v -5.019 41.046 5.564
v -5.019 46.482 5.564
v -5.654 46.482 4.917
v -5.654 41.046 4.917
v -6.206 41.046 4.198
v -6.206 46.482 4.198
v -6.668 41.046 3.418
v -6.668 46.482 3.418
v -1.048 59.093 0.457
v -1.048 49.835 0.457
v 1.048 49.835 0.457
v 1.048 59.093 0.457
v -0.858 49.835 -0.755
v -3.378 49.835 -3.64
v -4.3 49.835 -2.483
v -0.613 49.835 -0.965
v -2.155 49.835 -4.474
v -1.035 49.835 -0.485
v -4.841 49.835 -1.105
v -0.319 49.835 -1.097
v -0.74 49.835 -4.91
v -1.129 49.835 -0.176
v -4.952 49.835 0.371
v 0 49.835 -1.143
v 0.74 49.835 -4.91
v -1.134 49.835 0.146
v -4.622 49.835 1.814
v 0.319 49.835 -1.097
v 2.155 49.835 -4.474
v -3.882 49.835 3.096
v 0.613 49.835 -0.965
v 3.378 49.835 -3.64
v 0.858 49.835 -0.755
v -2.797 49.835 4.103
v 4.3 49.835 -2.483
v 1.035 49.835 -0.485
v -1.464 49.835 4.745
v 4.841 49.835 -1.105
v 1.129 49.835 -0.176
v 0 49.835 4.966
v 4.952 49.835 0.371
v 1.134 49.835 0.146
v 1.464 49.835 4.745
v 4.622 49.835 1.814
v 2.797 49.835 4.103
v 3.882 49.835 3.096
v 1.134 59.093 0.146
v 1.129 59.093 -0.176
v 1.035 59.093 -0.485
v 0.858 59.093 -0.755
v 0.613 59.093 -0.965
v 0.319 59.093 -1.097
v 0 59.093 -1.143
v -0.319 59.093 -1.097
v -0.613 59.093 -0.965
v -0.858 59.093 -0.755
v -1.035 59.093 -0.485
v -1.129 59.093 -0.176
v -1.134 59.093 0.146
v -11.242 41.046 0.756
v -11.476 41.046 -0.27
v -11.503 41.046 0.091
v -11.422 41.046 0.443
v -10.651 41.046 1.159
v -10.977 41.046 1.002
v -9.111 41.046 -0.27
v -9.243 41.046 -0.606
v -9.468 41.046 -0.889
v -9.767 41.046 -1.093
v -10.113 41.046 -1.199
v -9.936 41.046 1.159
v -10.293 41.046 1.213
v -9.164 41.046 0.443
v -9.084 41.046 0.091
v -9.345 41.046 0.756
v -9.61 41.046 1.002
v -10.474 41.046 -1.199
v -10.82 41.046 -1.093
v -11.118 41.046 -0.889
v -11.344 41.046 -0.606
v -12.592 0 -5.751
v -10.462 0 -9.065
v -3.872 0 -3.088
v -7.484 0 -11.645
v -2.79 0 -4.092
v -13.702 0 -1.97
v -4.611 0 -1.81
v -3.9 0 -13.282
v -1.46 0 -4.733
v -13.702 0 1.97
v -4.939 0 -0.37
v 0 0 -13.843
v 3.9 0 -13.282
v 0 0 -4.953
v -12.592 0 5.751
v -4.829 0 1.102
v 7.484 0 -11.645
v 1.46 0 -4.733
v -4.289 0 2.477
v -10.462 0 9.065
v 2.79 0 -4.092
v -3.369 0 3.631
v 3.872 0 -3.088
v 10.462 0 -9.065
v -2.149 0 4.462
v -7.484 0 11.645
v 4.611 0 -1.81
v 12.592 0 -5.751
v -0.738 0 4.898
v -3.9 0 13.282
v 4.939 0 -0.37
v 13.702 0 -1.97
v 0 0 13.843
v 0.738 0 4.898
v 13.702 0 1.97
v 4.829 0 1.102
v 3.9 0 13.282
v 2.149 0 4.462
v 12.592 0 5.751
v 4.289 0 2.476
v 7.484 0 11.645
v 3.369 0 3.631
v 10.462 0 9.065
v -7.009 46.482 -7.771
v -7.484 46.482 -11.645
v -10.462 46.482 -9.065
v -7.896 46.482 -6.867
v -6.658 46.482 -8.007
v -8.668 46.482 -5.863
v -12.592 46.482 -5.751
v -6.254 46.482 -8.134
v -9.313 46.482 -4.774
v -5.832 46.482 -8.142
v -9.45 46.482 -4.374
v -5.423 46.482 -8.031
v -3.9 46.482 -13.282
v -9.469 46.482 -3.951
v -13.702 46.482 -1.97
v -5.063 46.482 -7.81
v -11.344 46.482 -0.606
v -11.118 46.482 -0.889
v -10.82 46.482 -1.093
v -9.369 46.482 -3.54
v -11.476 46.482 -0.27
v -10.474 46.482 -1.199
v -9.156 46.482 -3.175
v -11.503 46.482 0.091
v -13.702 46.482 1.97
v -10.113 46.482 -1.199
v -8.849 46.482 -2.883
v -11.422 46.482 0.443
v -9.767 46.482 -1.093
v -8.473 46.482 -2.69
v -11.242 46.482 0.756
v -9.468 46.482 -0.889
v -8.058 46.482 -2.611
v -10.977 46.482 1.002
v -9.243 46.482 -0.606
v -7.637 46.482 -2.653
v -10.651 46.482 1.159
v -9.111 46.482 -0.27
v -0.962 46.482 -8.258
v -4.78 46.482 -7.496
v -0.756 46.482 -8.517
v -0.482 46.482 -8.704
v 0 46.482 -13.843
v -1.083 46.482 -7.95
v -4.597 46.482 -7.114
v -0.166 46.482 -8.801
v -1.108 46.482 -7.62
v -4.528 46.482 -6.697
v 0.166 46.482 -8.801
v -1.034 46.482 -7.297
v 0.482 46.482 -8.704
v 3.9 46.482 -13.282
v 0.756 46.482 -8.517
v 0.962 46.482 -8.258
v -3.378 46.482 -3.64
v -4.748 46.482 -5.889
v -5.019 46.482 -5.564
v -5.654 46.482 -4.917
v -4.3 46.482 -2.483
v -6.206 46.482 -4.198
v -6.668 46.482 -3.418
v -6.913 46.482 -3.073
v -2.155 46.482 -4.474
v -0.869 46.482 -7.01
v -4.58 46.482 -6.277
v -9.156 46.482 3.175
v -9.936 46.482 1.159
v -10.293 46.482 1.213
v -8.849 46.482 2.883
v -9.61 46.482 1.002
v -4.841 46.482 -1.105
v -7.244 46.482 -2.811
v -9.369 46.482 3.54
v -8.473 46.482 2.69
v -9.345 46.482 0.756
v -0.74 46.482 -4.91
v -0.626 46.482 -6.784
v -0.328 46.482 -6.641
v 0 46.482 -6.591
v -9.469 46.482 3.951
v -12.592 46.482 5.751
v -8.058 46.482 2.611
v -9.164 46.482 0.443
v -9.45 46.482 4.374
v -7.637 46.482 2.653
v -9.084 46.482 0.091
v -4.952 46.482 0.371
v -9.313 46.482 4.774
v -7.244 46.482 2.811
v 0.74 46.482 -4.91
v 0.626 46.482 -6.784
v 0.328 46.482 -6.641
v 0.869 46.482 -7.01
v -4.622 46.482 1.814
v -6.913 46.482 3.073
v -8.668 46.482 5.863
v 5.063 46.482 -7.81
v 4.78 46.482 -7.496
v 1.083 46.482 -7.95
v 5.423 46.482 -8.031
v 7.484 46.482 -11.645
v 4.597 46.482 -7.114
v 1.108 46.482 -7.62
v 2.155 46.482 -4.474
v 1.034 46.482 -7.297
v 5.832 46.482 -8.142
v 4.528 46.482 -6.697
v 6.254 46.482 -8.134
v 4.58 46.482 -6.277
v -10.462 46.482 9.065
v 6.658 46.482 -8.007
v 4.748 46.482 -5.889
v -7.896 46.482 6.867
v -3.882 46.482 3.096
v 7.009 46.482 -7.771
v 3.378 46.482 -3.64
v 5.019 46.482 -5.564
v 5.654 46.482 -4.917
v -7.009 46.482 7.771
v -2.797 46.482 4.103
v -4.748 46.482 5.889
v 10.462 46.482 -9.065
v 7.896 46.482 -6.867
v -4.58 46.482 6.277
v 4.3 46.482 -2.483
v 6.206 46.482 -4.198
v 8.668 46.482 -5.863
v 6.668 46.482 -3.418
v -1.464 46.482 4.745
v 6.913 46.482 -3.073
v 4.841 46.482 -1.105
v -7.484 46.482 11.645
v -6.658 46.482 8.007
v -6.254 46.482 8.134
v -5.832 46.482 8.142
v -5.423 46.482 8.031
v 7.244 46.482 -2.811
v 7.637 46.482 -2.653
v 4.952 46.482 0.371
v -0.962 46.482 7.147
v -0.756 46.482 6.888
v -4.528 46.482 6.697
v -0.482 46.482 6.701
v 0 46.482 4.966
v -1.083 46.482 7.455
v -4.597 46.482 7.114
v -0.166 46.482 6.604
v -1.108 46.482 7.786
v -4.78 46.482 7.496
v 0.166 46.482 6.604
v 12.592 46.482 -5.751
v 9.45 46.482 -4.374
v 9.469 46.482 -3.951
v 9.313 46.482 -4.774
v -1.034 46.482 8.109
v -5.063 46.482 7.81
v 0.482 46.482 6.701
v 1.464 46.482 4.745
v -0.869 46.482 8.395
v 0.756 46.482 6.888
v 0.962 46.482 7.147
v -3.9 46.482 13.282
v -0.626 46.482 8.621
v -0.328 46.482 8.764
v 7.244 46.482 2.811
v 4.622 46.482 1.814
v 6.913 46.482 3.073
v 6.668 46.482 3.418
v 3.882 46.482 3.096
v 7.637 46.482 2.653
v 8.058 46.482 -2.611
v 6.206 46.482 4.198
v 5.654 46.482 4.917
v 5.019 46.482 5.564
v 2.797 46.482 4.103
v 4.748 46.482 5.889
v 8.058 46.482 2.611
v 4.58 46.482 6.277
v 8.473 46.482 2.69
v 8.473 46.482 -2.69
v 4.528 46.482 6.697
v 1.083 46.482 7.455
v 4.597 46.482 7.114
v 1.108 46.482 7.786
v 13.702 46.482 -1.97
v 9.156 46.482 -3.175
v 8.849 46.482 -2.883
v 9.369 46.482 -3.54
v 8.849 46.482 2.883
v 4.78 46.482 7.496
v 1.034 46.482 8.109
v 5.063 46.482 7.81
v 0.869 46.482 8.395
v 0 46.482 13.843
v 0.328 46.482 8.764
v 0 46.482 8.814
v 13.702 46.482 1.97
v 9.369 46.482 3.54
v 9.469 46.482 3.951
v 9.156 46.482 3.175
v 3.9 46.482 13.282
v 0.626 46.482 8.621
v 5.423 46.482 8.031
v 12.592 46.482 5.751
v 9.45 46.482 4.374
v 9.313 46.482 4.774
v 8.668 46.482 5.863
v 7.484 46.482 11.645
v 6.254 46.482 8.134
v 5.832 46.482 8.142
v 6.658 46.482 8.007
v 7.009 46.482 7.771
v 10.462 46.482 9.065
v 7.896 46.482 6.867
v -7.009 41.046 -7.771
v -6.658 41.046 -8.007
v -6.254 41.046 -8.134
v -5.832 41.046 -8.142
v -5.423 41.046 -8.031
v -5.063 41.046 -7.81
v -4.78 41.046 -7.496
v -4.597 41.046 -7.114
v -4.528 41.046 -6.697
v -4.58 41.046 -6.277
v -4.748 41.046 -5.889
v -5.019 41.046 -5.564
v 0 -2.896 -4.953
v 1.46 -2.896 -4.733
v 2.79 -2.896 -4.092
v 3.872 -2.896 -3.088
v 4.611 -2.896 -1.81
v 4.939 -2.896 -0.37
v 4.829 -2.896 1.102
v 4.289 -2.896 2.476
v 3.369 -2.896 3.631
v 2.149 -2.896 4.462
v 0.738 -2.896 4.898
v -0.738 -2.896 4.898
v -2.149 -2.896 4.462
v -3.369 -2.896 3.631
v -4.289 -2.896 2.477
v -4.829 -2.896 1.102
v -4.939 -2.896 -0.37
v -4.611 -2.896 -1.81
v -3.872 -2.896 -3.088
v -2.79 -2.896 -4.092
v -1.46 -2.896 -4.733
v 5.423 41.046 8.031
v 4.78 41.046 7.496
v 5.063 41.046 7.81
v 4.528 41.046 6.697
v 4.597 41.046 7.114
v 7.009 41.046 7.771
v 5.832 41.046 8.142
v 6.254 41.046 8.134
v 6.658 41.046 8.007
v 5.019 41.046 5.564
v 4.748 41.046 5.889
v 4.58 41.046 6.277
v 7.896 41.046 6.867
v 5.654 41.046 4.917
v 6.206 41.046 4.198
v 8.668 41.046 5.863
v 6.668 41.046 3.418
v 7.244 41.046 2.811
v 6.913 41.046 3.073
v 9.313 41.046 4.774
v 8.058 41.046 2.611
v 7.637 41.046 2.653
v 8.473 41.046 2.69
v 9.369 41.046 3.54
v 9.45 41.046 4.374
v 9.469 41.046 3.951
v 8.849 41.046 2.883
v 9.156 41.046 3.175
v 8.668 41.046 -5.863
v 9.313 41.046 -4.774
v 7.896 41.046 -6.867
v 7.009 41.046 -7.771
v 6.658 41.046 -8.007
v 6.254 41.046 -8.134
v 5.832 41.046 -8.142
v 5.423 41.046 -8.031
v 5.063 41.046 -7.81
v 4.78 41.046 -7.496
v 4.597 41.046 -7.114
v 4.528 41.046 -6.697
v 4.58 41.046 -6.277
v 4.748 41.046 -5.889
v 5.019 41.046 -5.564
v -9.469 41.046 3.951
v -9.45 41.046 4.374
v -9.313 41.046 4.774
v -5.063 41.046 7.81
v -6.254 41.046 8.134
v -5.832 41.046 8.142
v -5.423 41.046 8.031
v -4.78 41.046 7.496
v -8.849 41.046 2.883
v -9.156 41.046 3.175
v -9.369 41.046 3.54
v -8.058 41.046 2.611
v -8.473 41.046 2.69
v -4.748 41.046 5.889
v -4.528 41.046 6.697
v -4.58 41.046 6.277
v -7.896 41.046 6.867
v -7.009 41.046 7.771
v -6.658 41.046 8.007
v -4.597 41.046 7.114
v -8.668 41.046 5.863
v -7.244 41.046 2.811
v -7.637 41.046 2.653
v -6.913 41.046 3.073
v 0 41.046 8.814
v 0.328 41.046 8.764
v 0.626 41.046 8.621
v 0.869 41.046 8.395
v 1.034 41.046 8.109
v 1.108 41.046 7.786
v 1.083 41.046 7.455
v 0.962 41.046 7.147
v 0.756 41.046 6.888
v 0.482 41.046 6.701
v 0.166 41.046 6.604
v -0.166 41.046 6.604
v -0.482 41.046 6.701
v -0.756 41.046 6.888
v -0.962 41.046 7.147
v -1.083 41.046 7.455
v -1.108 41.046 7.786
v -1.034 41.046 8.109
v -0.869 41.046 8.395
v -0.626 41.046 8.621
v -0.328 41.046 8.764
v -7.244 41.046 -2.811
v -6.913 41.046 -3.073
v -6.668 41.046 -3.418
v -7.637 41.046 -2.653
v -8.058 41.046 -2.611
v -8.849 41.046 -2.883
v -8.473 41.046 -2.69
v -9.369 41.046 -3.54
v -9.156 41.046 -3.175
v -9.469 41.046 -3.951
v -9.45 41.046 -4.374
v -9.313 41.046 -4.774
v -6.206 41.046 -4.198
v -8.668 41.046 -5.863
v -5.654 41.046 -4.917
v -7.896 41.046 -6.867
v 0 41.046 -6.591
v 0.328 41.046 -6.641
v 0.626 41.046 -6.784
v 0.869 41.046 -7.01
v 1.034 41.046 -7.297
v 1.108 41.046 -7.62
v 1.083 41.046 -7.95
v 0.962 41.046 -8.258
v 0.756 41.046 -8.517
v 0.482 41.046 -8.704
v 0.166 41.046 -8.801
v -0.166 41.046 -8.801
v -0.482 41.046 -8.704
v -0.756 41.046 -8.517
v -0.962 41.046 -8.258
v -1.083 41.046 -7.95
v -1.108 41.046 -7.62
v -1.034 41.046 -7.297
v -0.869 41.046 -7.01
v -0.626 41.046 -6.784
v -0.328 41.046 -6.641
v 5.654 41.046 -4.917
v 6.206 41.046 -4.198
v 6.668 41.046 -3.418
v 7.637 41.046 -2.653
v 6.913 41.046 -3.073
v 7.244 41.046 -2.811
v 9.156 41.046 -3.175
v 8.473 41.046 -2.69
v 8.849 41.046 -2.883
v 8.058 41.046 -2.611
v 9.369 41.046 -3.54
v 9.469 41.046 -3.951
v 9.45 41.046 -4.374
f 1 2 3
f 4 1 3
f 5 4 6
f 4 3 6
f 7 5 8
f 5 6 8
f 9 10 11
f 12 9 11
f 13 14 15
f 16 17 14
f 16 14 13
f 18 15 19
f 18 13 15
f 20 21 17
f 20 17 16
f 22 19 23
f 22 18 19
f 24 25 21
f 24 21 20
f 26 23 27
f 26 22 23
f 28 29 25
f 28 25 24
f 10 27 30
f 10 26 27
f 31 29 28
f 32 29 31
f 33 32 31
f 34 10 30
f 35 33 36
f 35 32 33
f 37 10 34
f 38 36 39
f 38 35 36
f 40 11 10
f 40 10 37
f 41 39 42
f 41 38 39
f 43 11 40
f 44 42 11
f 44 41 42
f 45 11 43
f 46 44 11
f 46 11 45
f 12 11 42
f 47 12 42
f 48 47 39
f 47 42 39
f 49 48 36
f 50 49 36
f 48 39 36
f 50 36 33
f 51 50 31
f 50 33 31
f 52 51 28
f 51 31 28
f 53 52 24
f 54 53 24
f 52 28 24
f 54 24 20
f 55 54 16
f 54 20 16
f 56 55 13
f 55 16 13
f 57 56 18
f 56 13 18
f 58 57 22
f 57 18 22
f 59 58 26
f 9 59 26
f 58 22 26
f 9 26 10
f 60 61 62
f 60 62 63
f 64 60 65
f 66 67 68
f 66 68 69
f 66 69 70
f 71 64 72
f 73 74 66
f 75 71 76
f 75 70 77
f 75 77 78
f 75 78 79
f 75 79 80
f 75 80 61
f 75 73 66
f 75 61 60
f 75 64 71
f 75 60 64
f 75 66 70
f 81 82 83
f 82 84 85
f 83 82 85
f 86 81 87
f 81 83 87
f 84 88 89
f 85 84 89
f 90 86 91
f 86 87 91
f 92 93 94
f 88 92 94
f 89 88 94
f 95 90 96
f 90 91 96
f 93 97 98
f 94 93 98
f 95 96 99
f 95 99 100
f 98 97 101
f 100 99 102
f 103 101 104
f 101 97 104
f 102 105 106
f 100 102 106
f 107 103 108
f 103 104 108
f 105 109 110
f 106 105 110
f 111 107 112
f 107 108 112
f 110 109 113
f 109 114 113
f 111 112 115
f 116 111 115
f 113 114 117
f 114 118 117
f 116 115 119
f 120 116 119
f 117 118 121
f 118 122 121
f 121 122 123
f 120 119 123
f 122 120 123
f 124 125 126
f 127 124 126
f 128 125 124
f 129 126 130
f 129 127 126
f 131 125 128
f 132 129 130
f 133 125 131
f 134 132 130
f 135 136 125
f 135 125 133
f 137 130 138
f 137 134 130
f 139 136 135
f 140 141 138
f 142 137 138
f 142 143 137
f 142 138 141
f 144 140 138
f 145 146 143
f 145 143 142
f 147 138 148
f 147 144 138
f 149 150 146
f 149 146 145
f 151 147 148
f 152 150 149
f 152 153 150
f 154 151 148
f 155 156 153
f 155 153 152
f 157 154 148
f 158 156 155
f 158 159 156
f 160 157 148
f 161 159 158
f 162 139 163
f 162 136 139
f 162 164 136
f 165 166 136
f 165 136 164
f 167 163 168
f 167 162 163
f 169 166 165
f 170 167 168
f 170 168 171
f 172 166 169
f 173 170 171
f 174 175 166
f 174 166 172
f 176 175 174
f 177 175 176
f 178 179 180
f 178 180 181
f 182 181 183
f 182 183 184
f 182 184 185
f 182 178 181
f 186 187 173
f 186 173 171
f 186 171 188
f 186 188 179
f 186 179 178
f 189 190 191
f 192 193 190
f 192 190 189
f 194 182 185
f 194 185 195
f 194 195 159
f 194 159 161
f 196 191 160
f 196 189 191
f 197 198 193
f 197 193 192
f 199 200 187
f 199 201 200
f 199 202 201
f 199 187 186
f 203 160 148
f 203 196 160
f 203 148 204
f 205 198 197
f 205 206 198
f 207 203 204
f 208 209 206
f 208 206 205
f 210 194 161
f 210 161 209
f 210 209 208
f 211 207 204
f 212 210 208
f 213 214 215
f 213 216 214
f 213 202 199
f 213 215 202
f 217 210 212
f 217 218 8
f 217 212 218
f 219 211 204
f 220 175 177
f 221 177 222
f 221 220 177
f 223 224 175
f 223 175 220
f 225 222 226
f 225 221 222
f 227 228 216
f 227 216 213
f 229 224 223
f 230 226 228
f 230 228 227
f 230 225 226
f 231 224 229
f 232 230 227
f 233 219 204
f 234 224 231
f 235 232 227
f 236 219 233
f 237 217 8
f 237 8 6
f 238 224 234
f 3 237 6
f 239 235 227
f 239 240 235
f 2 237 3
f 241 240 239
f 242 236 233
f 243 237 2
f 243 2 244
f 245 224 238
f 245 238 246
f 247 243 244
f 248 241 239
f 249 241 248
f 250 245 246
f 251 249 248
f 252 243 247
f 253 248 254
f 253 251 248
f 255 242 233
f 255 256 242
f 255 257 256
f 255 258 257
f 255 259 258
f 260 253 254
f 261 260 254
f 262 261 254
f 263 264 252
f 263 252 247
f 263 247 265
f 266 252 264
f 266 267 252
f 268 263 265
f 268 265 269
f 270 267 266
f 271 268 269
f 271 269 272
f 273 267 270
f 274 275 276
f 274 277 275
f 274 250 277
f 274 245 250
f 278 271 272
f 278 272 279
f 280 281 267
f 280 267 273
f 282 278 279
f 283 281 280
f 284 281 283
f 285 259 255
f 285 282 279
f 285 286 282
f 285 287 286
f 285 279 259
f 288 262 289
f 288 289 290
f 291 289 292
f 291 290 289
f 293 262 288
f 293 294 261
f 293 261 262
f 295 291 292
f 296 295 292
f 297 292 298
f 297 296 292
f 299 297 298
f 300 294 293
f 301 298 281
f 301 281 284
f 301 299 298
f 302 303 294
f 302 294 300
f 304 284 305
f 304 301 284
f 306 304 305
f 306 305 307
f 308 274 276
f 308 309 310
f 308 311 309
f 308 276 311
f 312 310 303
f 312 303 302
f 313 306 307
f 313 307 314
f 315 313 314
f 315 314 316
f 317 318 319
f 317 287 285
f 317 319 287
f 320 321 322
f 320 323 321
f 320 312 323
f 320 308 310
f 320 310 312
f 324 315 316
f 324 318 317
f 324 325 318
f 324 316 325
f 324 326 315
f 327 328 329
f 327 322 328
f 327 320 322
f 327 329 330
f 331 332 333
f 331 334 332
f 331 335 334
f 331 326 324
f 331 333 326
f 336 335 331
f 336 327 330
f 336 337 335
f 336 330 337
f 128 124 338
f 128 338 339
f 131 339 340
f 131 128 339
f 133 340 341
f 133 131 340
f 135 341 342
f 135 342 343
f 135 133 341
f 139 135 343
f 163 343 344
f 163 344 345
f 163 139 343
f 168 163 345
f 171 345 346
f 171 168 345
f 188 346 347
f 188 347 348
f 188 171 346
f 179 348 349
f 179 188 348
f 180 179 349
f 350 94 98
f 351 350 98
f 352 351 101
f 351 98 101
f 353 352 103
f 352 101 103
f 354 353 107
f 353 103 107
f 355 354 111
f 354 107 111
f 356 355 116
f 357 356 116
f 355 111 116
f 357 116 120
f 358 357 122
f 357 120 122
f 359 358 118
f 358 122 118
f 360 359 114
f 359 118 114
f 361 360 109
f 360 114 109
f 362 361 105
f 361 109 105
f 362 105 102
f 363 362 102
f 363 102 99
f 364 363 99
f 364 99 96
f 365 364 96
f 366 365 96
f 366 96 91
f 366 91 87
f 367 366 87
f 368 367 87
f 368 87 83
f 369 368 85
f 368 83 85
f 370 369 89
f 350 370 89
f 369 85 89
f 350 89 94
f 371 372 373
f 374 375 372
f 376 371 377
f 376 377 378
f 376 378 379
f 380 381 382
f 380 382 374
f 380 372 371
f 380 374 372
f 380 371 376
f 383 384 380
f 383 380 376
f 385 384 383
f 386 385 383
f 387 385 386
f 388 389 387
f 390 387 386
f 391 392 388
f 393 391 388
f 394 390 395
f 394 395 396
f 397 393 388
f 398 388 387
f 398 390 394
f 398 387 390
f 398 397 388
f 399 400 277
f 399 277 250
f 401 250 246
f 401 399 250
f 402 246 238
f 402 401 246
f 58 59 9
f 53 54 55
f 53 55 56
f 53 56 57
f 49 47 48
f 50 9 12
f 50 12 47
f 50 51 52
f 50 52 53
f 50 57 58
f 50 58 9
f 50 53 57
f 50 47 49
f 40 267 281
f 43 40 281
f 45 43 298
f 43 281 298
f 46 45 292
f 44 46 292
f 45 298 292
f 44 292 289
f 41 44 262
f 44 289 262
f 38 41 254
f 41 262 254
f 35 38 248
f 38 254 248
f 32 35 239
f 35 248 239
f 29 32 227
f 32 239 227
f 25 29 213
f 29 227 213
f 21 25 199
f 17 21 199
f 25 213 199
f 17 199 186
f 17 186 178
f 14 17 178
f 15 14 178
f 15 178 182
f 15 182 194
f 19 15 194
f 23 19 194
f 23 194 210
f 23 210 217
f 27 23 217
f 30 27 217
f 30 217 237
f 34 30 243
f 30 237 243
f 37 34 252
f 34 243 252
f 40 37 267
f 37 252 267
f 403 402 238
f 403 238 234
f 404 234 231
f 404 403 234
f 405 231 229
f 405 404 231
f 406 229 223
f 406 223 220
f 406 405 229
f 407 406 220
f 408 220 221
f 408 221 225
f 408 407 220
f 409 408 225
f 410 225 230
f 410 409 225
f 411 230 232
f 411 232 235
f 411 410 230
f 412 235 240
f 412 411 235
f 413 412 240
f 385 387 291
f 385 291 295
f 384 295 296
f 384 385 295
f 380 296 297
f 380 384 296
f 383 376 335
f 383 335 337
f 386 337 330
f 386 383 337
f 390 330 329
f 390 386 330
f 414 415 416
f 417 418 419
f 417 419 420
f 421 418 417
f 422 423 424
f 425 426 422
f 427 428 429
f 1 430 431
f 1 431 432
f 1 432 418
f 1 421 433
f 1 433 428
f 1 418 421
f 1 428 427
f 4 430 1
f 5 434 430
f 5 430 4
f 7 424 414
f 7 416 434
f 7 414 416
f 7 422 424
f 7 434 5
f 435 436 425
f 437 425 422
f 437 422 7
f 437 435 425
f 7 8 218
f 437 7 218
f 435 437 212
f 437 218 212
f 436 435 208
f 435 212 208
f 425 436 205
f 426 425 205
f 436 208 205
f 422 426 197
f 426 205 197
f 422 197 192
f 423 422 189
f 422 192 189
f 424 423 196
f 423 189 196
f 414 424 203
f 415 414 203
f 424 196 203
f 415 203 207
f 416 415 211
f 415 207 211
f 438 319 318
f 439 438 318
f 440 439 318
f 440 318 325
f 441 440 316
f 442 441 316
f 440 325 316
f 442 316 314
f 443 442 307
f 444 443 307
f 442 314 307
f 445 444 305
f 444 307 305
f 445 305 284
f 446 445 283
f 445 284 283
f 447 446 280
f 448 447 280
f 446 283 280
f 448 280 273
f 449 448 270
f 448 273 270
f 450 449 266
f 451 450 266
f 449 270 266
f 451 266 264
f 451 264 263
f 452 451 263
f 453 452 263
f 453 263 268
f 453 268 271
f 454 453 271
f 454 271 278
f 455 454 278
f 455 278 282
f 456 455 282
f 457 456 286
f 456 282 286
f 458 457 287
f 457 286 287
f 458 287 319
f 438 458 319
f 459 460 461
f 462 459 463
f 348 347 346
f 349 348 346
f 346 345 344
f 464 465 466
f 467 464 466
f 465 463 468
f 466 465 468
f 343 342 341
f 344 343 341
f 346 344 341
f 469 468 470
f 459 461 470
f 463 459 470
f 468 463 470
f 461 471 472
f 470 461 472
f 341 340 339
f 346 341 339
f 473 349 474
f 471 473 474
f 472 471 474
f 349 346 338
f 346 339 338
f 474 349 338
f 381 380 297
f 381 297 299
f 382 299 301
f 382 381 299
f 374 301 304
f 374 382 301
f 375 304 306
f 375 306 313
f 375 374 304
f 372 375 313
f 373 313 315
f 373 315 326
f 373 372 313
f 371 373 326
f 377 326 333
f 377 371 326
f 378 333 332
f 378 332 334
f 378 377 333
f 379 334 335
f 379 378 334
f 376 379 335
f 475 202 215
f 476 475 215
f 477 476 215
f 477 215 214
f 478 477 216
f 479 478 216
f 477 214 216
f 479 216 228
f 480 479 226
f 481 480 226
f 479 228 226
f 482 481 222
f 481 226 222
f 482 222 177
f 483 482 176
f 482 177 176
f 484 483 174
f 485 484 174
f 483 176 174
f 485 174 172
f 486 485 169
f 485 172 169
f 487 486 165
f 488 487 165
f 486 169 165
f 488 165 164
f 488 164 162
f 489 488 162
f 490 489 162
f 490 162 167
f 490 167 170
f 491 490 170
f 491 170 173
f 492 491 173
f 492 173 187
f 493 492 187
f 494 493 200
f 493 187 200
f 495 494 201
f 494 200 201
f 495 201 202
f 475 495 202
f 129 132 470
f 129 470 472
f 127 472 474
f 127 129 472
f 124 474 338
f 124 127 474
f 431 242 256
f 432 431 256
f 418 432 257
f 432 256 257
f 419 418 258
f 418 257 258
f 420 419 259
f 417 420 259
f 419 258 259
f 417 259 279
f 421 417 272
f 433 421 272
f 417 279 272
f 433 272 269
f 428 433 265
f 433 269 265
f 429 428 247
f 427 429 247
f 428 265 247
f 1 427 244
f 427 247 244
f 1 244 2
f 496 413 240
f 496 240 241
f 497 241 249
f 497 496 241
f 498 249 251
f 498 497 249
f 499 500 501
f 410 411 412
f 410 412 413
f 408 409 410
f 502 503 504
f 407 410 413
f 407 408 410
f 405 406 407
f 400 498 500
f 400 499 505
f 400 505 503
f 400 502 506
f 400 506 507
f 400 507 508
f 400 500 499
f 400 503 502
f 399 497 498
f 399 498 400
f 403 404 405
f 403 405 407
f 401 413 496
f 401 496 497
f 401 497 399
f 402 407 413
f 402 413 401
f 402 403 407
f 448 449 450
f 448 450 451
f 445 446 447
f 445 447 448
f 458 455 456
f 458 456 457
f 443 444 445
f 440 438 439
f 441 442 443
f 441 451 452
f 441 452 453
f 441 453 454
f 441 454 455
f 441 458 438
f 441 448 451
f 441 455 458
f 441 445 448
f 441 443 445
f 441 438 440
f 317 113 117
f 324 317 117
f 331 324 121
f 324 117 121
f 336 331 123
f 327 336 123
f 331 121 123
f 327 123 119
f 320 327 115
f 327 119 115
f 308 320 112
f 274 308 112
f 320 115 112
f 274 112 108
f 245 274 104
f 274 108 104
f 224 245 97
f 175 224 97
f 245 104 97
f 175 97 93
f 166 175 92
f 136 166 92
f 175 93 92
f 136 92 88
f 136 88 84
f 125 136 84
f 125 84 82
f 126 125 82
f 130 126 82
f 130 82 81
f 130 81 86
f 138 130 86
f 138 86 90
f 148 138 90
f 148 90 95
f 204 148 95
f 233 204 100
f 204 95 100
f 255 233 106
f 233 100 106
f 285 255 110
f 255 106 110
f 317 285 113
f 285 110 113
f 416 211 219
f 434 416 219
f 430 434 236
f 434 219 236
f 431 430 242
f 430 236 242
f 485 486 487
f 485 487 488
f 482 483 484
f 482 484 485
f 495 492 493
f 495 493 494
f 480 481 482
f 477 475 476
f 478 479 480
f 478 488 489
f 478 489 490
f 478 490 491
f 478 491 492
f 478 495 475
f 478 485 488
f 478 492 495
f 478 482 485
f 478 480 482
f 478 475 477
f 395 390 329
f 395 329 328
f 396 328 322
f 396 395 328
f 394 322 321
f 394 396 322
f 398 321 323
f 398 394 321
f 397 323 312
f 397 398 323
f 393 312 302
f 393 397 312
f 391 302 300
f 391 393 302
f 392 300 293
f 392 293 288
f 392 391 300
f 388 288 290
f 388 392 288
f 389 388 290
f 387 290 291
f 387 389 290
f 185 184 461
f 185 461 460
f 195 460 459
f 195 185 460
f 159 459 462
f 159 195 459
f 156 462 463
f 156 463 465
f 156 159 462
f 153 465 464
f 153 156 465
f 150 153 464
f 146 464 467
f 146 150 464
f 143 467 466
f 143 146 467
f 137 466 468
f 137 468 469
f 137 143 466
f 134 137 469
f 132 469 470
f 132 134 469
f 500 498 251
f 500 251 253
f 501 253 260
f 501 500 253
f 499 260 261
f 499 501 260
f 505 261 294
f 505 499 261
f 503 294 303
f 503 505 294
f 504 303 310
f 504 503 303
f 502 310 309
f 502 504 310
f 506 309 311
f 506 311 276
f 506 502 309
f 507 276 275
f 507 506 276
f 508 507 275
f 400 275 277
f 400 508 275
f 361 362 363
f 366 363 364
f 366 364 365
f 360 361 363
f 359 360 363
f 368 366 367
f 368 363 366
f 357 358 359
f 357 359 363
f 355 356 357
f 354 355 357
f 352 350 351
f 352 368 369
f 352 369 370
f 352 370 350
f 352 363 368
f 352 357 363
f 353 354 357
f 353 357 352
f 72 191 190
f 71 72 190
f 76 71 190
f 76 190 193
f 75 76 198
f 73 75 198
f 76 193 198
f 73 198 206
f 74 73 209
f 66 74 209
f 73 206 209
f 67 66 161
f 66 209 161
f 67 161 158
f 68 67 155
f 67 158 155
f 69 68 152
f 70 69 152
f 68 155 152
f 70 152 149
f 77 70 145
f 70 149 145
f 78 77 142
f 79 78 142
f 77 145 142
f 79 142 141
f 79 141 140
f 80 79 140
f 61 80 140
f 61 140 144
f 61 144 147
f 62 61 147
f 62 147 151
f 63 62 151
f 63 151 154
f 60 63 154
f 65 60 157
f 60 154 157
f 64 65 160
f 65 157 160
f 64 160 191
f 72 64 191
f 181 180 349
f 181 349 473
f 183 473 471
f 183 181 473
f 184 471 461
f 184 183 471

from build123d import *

# Parameters (mm, degrees)
SKETCH1_R           = 13.843
BOSS_EXTRUDE1_DEPTH = 46.482
SKETCH2_R           = 4.9657
BOSS_EXTRUDE2_DEPTH = 3.3528
SKETCH3_R           = 4.953
BOSS_EXTRUDE3_DEPTH = 2.8956
BOSS_EXTRUDE4_DEPTH = 9.2583
SKETCH5_R           = 1.11125
SKETCH5_R_2         = 1.21285
CUT_EXTRUDE1_DEPTH  = 5.4356
MIRROR1_START       = 41.0464
MIRROR1_DEPTH       = 5.4356


# Read off the part's stored shape, not the designer's step: Mirror1
with BuildPart() as part:
    # Sketch1 → Boss-Extrude1 (new body)
    with BuildSketch(Plane(origin=(0, 0, 0), x_dir=(1, 0, 0), z_dir=(0, 1, 0))):
        with Locations(Location((0, 0, 0), (0, 0, 270))):
            Circle(SKETCH1_R)
    extrude(amount=BOSS_EXTRUDE1_DEPTH)

    # Sketch2 → Boss-Extrude2 (add)
    with BuildSketch(Plane(origin=(0, 46.482, 0), x_dir=(1, 0, 0), z_dir=(0, 1, 0))):
        with Locations(Location((0, 0, 0), (0, 0, 270))):
            Circle(SKETCH2_R)
    extrude(amount=BOSS_EXTRUDE2_DEPTH)

    # Sketch3 → Boss-Extrude3 (add)
    with BuildSketch(Plane.XZ):
        with Locations(Location((0, 0, 0), (0, 0, 270))):
            Circle(SKETCH3_R)
    extrude(amount=BOSS_EXTRUDE3_DEPTH)

    # Sketch4 → Boss-Extrude4 (add)
    with BuildSketch(Plane(origin=(0, 49.8348, 0), x_dir=(1, 0, 0), z_dir=(0, 1, 0))):
        with BuildLine():
            Line((-1.047576804, -0.4572), (1.047576804, -0.4572))
            ThreePointArc((1.047576804, -0.4572), (0, 1.143), (-1.047576804, -0.4572))
        make_face()
    extrude(amount=BOSS_EXTRUDE4_DEPTH)

    # Sketch5 → Cut-Extrude1 (cut)
    with BuildSketch(Plane(origin=(0, 46.482, 0), x_dir=(1, 0, 0), z_dir=(0, 1, 0))):
        with Locations(Location((0, 7.70255, 0), (0, 0, 270))):
            Circle(SKETCH5_R)
        with Locations(Location((0, -7.70255, 0), (0, 0, 270))):
            Circle(SKETCH5_R)
        with Locations(Location((-10.29335, 0, 0), (0, 0, 270))):
            Circle(SKETCH5_R_2)
        with BuildLine():
            ThreePointArc((-5.018539731, 5.564108911), (-5.941000388, 4.566132214), (-6.668031862, 3.417952617))
            ThreePointArc((-6.668031862, 3.417952617), (-8.668133869, 2.773445377), (-9.312641109, 4.773547383))
            ThreePointArc((-9.312641109, 4.773547383), (-8.297261558, 6.377106685), (-7.008943624, 7.770891089))
            ThreePointArc((-7.008943624, 7.770891089), (-4.910350588, 7.662701947), (-5.018539731, 5.564108911))
        make_face()
        with BuildLine():
            ThreePointArc((-6.668031862, -3.417952617), (-8.668133869, -2.773445377), (-9.312641109, -4.773547383))
            ThreePointArc((-9.312641109, -4.773547383), (-8.297261558, -6.377106685), (-7.008943624, -7.770891089))
            ThreePointArc((-7.008943624, -7.770891089), (-4.910350588, -7.662701947), (-5.018539731, -5.564108911))
            ThreePointArc((-5.018539731, -5.564108911), (-5.941000388, -4.566132214), (-6.668031862, -3.417952617))
        make_face()
    extrude(amount=-CUT_EXTRUDE1_DEPTH, mode=Mode.SUBTRACT)

    # Mirror1 outline → Mirror1 (cut)
    with BuildSketch(Plane(origin=(0, 0, 0), x_dir=(1, 0, 0), z_dir=(0, 1, 0)).offset(MIRROR1_START)):
        with BuildLine():
            ThreePointArc((7.008943624, -7.770891089), (8.297261558, -6.377106685), (9.312641109, -4.773547383))
            ThreePointArc((9.312641109, -4.773547383), (8.668133868, -2.773445377), (6.668031862, -3.417952617))
            ThreePointArc((6.668031862, -3.417952617), (5.941000388, -4.566132214), (5.018539731, -5.564108911))
            ThreePointArc((5.018539731, -5.564108911), (4.910350588, -7.662701947), (7.008943624, -7.770891089))
        make_face()
        with BuildLine():
            ThreePointArc((6.668031862, 3.417952617), (8.668133868, 2.773445377), (9.312641109, 4.773547383))
            ThreePointArc((9.312641109, 4.773547383), (8.297261558, 6.377106685), (7.008943624, 7.770891089))
            ThreePointArc((7.008943624, 7.770891089), (4.910350588, 7.662701947), (5.018539731, 5.564108911))
            ThreePointArc((5.018539731, 5.564108911), (5.941000388, 4.566132214), (6.668031862, 3.417952617))
        make_face()
    extrude(amount=MIRROR1_DEPTH, mode=Mode.SUBTRACT)


solid = part.part
